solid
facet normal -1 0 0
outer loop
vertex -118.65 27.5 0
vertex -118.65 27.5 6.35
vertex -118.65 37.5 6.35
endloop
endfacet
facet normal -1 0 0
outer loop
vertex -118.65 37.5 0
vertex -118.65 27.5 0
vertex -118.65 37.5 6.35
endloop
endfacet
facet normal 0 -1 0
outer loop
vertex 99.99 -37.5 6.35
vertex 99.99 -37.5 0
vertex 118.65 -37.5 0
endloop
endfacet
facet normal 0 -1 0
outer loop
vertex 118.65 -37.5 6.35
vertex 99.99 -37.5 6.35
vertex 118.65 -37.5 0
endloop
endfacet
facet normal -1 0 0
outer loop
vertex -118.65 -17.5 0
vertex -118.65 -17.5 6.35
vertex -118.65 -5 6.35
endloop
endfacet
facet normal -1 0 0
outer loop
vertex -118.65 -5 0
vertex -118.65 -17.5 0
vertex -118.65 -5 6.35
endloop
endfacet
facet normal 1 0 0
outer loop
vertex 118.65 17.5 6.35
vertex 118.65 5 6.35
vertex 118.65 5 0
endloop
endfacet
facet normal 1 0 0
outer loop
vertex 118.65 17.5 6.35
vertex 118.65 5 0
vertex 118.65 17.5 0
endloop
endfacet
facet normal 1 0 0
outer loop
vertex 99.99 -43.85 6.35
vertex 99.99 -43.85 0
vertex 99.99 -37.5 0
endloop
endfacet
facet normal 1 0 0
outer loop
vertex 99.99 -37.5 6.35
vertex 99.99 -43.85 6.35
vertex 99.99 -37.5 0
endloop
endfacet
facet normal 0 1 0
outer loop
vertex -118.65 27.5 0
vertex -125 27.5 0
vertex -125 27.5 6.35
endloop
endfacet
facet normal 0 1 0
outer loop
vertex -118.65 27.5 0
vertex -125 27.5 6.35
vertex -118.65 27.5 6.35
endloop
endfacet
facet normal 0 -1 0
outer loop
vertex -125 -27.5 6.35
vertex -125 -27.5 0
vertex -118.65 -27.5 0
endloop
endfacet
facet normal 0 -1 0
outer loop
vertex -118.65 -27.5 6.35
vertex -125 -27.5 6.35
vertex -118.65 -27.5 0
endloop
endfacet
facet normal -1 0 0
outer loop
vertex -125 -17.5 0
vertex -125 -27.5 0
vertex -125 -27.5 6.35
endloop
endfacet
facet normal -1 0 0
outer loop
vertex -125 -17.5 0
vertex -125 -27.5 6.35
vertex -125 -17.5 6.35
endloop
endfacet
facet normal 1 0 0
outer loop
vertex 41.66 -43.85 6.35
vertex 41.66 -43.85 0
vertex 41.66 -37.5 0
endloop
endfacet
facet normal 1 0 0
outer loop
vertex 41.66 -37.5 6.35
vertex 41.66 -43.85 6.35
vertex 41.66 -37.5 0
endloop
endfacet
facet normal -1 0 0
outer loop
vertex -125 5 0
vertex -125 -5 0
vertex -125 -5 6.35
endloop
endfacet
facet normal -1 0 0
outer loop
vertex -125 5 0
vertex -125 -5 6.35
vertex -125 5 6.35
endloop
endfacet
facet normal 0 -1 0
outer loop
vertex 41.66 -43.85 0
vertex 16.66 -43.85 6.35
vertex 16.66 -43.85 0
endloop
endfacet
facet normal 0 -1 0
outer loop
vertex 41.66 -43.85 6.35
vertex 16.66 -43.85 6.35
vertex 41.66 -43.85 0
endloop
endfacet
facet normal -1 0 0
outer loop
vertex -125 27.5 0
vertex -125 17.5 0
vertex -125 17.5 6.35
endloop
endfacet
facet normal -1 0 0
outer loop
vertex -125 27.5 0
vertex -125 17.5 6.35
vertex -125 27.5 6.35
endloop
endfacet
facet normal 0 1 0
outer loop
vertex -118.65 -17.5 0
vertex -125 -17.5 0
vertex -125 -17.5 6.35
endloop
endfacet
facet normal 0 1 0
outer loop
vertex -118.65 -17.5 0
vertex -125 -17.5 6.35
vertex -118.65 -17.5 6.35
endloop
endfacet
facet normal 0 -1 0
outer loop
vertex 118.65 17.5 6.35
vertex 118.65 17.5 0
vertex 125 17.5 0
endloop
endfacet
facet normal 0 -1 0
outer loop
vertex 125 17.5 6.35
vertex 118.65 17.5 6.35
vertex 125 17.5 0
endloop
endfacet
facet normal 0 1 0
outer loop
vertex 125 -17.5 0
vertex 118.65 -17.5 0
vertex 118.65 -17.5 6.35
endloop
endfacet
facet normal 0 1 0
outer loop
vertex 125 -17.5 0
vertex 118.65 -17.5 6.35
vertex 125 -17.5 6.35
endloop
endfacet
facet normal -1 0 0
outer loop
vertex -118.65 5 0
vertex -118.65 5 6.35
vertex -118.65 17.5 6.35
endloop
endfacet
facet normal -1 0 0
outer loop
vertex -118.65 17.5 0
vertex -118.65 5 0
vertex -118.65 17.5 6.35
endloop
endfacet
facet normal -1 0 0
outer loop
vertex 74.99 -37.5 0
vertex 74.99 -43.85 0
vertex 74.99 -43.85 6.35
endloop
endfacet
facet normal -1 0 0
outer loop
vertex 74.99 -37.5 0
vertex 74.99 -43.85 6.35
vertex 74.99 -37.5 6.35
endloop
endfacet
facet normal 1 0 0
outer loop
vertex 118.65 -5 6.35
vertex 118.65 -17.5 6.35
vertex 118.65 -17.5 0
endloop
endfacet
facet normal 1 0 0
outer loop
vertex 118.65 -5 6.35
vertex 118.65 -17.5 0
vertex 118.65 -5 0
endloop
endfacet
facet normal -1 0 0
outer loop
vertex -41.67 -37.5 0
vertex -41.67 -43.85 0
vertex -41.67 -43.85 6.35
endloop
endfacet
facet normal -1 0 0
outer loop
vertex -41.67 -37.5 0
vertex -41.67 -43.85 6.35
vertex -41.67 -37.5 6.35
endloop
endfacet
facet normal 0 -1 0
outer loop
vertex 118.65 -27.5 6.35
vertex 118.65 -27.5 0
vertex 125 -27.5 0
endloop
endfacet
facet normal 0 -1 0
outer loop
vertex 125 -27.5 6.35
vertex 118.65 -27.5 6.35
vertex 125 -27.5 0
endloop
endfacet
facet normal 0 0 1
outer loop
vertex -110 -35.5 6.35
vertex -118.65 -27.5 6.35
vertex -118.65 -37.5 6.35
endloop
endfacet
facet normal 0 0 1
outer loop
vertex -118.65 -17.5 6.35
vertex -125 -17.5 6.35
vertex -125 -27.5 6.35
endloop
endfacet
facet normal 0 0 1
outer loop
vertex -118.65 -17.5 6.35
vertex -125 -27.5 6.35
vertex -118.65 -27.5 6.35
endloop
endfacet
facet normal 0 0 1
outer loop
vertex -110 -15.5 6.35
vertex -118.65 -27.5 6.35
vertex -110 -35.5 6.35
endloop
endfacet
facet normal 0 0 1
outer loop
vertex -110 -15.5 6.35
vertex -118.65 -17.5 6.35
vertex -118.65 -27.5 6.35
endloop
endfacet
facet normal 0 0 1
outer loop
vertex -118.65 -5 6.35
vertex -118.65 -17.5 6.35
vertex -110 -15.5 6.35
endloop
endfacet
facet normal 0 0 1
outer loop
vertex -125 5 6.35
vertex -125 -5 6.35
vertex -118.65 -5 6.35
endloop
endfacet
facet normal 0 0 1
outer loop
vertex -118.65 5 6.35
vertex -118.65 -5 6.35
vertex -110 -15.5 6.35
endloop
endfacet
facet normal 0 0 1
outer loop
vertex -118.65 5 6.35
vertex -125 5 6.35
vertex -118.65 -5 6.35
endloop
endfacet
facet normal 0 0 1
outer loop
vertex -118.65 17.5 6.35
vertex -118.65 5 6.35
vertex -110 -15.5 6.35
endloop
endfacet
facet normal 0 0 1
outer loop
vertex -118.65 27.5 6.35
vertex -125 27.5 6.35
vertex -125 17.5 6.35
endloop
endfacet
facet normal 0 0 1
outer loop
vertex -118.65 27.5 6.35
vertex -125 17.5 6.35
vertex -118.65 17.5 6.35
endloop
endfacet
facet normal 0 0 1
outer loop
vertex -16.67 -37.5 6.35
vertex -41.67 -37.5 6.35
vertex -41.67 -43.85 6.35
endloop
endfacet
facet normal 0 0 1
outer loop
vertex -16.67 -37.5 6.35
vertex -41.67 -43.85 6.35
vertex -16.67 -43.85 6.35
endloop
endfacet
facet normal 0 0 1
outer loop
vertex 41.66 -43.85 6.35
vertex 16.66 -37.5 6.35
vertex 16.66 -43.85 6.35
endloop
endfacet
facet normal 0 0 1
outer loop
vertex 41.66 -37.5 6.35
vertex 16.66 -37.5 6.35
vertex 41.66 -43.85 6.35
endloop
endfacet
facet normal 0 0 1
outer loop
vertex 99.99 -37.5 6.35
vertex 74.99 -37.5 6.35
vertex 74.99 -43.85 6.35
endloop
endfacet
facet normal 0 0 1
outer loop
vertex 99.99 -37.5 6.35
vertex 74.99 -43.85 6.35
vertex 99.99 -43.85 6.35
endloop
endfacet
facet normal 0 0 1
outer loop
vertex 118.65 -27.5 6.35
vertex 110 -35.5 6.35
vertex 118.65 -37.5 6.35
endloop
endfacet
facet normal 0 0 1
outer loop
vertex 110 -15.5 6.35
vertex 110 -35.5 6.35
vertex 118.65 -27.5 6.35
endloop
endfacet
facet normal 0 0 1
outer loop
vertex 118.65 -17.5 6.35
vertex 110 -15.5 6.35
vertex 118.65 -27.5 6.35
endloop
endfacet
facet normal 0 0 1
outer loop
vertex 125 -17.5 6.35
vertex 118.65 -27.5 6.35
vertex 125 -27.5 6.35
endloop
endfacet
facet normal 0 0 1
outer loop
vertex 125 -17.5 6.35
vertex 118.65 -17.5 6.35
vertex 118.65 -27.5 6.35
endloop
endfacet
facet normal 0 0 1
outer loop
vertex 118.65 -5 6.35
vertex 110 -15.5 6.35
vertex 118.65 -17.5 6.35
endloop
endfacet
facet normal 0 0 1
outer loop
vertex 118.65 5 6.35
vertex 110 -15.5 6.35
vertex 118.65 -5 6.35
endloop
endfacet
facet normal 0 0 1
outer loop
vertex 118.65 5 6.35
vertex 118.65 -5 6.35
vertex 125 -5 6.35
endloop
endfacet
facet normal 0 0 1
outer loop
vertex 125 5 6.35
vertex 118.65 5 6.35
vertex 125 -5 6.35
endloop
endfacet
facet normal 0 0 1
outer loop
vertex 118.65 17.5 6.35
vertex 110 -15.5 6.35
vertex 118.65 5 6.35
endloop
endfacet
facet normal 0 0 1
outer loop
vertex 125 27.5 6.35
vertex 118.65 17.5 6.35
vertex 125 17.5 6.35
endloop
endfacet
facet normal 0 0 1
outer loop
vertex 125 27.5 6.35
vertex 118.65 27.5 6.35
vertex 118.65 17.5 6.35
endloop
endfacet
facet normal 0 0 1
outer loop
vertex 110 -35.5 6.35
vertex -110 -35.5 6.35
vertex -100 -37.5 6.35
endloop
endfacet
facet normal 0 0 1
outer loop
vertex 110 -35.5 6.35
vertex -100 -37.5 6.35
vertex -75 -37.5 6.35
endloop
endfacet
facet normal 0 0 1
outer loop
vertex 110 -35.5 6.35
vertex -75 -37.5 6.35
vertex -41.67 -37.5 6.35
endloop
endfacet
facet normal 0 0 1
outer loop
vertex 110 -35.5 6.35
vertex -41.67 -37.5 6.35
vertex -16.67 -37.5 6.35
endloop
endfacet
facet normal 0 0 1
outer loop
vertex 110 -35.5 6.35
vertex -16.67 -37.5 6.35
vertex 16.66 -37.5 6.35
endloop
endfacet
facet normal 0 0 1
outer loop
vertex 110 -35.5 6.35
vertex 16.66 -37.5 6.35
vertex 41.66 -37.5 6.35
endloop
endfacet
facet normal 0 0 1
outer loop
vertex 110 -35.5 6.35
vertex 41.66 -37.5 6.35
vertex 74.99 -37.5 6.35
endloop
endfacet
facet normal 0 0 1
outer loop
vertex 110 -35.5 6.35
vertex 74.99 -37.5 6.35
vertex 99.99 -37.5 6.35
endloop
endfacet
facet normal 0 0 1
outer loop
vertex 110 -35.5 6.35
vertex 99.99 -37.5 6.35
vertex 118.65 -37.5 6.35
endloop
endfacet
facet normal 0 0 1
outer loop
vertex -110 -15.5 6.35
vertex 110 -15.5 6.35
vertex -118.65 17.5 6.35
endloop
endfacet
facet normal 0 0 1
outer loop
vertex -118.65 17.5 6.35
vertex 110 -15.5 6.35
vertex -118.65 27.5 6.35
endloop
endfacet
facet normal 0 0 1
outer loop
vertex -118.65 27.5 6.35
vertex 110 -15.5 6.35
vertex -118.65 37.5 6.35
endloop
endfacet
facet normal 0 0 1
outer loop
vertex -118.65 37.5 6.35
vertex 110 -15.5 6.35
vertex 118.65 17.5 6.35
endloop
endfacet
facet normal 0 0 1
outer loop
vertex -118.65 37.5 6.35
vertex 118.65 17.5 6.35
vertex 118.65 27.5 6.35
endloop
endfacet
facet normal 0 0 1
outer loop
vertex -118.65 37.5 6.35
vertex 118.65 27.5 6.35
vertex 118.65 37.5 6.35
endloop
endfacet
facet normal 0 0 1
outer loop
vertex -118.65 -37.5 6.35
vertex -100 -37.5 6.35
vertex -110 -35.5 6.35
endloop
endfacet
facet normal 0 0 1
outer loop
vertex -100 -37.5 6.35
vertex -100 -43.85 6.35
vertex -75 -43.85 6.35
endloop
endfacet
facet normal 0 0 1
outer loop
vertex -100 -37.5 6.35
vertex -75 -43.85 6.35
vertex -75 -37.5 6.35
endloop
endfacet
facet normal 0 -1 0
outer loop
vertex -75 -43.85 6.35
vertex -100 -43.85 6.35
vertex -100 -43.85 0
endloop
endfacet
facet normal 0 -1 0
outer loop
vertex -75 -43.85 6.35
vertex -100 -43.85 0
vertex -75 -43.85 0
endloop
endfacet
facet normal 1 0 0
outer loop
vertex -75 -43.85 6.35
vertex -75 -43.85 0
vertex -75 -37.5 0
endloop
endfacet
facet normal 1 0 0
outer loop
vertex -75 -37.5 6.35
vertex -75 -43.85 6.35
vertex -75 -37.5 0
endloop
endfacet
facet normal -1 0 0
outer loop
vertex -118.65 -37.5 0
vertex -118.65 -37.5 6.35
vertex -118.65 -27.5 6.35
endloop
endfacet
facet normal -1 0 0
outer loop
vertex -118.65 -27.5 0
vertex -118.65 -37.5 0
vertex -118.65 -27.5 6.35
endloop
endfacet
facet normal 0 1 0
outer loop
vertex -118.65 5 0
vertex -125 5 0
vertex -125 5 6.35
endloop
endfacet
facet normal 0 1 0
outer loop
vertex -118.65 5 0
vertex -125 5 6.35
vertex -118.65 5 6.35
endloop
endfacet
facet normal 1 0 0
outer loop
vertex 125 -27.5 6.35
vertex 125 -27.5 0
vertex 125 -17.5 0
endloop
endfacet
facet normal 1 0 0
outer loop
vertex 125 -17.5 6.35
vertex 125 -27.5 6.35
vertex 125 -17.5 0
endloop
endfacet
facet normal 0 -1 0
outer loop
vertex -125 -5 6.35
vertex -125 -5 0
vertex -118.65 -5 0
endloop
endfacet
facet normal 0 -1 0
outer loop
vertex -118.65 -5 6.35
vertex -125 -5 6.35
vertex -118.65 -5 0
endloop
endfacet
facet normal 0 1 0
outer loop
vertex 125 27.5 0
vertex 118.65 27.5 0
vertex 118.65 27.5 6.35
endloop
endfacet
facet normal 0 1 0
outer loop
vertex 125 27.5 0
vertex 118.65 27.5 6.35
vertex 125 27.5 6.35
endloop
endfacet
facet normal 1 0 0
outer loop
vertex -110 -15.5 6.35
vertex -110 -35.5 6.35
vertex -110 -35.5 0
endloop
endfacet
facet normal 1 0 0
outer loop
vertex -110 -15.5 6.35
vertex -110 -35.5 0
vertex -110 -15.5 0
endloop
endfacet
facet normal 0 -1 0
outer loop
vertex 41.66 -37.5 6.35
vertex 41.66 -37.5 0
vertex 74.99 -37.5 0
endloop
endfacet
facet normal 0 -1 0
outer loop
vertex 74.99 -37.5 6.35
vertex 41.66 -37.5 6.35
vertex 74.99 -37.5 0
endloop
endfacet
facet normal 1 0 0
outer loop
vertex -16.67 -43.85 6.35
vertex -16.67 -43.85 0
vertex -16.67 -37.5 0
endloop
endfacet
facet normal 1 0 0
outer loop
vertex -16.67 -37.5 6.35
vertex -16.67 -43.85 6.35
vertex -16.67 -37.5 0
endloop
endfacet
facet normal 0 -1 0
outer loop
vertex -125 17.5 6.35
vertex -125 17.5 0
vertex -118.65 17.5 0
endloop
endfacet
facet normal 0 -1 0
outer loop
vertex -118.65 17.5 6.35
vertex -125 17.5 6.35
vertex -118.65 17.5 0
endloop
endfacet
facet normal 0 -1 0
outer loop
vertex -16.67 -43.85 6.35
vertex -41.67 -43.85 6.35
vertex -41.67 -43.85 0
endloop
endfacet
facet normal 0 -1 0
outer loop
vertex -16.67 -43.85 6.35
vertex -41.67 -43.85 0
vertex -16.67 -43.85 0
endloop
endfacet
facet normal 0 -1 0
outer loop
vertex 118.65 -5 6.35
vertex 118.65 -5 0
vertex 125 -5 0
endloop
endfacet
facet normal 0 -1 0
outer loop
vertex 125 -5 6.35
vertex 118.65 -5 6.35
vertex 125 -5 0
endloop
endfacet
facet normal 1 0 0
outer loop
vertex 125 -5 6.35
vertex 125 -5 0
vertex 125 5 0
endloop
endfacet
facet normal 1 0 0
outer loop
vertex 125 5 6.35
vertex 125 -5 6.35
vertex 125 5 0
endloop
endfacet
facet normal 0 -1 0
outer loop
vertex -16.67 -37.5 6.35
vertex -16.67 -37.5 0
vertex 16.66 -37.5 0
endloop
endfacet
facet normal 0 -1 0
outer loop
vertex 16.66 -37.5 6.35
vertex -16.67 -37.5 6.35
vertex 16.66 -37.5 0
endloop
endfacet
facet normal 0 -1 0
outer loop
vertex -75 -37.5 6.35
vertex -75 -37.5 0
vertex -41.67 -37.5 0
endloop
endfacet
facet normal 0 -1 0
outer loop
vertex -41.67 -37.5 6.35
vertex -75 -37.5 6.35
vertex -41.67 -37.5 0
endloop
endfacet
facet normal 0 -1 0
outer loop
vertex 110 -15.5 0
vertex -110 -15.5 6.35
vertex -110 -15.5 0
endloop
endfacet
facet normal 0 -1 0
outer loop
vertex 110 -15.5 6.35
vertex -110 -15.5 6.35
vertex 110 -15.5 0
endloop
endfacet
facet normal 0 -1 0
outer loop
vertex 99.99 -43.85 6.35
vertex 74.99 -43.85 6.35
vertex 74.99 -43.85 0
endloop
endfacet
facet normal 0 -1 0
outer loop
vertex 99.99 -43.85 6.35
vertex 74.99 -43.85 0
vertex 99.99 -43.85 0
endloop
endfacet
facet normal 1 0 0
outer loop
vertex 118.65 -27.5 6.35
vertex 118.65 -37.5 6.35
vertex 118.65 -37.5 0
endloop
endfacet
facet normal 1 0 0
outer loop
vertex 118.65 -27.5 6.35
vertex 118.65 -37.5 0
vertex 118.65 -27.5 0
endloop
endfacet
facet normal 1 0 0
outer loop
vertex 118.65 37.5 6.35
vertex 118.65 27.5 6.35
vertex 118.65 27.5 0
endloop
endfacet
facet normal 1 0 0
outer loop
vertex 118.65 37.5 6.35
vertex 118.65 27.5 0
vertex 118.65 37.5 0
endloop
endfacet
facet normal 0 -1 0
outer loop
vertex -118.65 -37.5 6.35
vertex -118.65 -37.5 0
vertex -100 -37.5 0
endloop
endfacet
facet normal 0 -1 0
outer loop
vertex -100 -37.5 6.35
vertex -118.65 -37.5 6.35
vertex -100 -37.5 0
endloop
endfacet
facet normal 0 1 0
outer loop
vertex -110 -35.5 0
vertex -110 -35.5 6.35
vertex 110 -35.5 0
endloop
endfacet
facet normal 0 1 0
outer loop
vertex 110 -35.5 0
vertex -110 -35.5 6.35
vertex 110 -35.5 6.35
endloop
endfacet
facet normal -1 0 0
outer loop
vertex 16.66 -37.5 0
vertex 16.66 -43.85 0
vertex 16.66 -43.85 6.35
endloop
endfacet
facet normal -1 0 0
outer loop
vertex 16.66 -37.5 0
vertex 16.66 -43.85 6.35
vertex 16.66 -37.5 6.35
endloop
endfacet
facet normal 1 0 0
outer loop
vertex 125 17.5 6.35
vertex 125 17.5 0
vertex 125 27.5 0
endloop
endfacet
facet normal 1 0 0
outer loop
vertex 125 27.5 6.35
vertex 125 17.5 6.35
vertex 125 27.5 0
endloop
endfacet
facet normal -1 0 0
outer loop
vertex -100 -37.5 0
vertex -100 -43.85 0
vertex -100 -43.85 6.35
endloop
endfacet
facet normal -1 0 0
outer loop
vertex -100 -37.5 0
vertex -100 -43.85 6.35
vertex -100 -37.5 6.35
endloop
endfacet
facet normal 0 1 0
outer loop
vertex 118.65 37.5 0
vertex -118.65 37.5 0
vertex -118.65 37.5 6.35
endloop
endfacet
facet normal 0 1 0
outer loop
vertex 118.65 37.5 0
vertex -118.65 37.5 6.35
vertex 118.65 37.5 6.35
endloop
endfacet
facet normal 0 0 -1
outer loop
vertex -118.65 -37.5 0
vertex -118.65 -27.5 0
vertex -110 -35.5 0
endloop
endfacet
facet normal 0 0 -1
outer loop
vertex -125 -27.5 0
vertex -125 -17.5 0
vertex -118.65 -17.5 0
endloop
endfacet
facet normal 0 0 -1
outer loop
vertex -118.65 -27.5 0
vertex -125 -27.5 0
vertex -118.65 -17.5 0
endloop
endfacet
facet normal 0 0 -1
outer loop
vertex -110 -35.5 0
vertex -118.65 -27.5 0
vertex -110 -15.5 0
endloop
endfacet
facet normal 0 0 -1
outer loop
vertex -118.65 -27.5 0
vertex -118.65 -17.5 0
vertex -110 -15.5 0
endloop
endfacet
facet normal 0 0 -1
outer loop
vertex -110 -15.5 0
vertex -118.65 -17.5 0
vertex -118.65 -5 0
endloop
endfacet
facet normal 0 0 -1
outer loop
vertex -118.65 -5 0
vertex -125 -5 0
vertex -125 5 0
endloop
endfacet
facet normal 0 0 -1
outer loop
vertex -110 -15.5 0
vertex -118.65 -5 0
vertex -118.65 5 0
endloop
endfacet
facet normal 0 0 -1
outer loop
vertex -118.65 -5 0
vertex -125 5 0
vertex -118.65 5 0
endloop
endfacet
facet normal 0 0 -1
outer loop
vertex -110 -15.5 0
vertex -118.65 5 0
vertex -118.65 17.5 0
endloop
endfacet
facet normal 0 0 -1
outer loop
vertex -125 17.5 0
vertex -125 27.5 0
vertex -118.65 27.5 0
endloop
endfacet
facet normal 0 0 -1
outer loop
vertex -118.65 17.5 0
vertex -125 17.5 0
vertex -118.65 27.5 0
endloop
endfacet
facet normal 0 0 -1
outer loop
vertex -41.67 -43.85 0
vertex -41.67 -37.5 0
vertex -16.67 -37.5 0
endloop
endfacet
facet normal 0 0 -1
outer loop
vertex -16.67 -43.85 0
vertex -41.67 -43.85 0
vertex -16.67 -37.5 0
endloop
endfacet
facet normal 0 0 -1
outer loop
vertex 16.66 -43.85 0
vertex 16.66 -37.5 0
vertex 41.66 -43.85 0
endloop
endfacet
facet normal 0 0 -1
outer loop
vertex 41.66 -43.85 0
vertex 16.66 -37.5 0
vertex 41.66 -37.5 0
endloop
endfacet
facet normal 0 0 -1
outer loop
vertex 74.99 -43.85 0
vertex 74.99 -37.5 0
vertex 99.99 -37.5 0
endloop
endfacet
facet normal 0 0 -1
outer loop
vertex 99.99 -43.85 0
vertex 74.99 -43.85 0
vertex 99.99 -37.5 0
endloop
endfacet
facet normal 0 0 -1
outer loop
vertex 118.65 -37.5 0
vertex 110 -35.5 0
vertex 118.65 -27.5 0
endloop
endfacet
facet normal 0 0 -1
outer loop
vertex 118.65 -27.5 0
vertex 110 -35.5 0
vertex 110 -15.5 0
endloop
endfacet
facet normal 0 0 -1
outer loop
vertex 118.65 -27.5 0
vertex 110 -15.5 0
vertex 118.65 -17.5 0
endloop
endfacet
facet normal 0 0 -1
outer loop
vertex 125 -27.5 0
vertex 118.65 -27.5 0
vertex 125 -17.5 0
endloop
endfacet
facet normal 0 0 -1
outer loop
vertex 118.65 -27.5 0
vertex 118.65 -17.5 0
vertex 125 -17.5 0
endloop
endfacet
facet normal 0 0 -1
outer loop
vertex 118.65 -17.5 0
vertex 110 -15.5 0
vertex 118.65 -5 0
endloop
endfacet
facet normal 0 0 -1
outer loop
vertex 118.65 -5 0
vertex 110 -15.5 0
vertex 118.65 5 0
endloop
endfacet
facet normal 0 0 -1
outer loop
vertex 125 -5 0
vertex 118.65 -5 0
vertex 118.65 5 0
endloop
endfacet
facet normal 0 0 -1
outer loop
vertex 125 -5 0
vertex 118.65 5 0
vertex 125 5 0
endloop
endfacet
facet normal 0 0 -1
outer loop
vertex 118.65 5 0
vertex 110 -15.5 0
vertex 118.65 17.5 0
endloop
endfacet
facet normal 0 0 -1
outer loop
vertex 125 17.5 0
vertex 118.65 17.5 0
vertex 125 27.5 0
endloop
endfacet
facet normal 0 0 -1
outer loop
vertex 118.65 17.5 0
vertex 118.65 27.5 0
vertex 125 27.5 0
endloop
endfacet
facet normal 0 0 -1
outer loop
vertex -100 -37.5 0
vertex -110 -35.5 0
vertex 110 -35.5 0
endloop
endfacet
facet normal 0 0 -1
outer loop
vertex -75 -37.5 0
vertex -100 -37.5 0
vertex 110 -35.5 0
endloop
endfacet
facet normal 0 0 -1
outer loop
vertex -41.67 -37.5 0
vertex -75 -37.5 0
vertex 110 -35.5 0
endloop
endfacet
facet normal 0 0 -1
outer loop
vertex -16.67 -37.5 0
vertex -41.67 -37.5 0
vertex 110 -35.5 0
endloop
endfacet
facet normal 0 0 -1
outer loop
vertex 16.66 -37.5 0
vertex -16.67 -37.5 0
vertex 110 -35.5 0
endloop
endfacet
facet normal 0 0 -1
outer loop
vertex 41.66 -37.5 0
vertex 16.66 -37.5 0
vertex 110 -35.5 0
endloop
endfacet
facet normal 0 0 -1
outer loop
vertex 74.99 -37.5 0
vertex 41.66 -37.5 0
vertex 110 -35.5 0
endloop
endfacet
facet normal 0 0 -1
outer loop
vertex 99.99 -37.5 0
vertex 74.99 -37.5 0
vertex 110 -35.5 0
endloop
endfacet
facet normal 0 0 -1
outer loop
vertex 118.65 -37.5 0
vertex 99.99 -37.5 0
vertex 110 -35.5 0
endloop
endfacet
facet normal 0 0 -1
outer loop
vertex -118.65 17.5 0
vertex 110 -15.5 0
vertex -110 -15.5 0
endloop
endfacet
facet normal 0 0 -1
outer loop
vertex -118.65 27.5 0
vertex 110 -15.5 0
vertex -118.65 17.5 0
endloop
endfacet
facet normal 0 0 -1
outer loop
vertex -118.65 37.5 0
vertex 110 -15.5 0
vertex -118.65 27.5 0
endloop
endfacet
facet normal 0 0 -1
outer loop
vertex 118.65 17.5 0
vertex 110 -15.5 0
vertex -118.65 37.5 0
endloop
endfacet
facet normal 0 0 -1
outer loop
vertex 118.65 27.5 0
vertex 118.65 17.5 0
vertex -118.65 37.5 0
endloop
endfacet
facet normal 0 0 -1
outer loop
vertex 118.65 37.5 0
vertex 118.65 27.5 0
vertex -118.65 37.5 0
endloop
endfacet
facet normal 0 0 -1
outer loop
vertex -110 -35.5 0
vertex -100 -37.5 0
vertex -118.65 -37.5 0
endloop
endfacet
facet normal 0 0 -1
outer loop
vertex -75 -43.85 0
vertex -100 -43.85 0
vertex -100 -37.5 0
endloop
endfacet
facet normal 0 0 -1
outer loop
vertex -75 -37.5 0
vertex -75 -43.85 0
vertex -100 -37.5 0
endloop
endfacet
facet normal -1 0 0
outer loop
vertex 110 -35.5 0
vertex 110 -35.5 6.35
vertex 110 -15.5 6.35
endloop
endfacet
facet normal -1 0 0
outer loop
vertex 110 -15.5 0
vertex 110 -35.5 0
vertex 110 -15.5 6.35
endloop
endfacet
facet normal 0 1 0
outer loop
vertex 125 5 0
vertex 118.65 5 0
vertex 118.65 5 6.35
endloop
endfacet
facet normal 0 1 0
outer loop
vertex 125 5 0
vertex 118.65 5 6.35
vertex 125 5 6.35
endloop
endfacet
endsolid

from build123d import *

# Parameters (mm, degrees)
F0_W     = 250
F0_H     = 75
F1_DEPTH = 6.35
F2_W     = 25
F2_H     = 6.35
F3_DEPTH = 6.35
F4_W     = 220
F4_H     = 20
F5_DEPTH = 25
F6_W     = 6.35
F6_H     = 10
F6_H_2   = 12.5
F6_H_3   = 16.35
F7_DEPTH = 6.35


# Not quite as in the source:
# - a length typed as a fraction of an inch, garbled in the dataset ("3 / 203.2 mm" for 3/8 in), is restored


with BuildPart() as f1:
    # F0 (on Top) → F1 (new body)
    with BuildSketch(Plane.XY):
        Rectangle(F0_W, F0_H)
    extrude(amount=F1_DEPTH)

    # F2 (on face) → F3 (join, through all)
    with BuildSketch(Plane.XY.offset(6.35)):
        with Locations((-87.5, -40.675)):
            Rectangle(F2_W, F2_H)
        with Locations((-29.17, -40.675)):
            Rectangle(F2_W, F2_H)
        with Locations((29.16, -40.675)):
            Rectangle(F2_W, F2_H)
        with Locations((87.49, -40.675)):
            Rectangle(F2_W, F2_H)
    extrude(amount=-F3_DEPTH)

    # F4 (on face) → F5 (cut)
    with BuildSketch(Plane.XY.offset(6.35)):
        with Locations((0, -25.5)):
            Rectangle(F4_W, F4_H)
    extrude(amount=-F5_DEPTH, mode=Mode.SUBTRACT)

    # F6 (on face) → F7 (cut, through all)
    with BuildSketch(Plane.XY.offset(6.35)):
        with Locations((121.825, 32.5)):
            Rectangle(F6_W, F6_H)
        with Locations((121.825, 11.25)):
            Rectangle(F6_W, F6_H_2)
        with Locations((121.825, -11.25)):
            Rectangle(F6_W, F6_H_2)
        with Locations((121.825, -35.675)):
            Rectangle(F6_W, F6_H_3)
        with Locations((-121.825, -35.675)):
            Rectangle(F6_W, F6_H_3)
        with Locations((-121.825, 32.5)):
            Rectangle(F6_W, F6_H)
        with Locations((-121.825, 11.25)):
            Rectangle(F6_W, F6_H_2)
        with Locations((-121.825, -11.25)):
            Rectangle(F6_W, F6_H_2)
    extrude(amount=-F7_DEPTH, mode=Mode.SUBTRACT)


solid = f1.part
